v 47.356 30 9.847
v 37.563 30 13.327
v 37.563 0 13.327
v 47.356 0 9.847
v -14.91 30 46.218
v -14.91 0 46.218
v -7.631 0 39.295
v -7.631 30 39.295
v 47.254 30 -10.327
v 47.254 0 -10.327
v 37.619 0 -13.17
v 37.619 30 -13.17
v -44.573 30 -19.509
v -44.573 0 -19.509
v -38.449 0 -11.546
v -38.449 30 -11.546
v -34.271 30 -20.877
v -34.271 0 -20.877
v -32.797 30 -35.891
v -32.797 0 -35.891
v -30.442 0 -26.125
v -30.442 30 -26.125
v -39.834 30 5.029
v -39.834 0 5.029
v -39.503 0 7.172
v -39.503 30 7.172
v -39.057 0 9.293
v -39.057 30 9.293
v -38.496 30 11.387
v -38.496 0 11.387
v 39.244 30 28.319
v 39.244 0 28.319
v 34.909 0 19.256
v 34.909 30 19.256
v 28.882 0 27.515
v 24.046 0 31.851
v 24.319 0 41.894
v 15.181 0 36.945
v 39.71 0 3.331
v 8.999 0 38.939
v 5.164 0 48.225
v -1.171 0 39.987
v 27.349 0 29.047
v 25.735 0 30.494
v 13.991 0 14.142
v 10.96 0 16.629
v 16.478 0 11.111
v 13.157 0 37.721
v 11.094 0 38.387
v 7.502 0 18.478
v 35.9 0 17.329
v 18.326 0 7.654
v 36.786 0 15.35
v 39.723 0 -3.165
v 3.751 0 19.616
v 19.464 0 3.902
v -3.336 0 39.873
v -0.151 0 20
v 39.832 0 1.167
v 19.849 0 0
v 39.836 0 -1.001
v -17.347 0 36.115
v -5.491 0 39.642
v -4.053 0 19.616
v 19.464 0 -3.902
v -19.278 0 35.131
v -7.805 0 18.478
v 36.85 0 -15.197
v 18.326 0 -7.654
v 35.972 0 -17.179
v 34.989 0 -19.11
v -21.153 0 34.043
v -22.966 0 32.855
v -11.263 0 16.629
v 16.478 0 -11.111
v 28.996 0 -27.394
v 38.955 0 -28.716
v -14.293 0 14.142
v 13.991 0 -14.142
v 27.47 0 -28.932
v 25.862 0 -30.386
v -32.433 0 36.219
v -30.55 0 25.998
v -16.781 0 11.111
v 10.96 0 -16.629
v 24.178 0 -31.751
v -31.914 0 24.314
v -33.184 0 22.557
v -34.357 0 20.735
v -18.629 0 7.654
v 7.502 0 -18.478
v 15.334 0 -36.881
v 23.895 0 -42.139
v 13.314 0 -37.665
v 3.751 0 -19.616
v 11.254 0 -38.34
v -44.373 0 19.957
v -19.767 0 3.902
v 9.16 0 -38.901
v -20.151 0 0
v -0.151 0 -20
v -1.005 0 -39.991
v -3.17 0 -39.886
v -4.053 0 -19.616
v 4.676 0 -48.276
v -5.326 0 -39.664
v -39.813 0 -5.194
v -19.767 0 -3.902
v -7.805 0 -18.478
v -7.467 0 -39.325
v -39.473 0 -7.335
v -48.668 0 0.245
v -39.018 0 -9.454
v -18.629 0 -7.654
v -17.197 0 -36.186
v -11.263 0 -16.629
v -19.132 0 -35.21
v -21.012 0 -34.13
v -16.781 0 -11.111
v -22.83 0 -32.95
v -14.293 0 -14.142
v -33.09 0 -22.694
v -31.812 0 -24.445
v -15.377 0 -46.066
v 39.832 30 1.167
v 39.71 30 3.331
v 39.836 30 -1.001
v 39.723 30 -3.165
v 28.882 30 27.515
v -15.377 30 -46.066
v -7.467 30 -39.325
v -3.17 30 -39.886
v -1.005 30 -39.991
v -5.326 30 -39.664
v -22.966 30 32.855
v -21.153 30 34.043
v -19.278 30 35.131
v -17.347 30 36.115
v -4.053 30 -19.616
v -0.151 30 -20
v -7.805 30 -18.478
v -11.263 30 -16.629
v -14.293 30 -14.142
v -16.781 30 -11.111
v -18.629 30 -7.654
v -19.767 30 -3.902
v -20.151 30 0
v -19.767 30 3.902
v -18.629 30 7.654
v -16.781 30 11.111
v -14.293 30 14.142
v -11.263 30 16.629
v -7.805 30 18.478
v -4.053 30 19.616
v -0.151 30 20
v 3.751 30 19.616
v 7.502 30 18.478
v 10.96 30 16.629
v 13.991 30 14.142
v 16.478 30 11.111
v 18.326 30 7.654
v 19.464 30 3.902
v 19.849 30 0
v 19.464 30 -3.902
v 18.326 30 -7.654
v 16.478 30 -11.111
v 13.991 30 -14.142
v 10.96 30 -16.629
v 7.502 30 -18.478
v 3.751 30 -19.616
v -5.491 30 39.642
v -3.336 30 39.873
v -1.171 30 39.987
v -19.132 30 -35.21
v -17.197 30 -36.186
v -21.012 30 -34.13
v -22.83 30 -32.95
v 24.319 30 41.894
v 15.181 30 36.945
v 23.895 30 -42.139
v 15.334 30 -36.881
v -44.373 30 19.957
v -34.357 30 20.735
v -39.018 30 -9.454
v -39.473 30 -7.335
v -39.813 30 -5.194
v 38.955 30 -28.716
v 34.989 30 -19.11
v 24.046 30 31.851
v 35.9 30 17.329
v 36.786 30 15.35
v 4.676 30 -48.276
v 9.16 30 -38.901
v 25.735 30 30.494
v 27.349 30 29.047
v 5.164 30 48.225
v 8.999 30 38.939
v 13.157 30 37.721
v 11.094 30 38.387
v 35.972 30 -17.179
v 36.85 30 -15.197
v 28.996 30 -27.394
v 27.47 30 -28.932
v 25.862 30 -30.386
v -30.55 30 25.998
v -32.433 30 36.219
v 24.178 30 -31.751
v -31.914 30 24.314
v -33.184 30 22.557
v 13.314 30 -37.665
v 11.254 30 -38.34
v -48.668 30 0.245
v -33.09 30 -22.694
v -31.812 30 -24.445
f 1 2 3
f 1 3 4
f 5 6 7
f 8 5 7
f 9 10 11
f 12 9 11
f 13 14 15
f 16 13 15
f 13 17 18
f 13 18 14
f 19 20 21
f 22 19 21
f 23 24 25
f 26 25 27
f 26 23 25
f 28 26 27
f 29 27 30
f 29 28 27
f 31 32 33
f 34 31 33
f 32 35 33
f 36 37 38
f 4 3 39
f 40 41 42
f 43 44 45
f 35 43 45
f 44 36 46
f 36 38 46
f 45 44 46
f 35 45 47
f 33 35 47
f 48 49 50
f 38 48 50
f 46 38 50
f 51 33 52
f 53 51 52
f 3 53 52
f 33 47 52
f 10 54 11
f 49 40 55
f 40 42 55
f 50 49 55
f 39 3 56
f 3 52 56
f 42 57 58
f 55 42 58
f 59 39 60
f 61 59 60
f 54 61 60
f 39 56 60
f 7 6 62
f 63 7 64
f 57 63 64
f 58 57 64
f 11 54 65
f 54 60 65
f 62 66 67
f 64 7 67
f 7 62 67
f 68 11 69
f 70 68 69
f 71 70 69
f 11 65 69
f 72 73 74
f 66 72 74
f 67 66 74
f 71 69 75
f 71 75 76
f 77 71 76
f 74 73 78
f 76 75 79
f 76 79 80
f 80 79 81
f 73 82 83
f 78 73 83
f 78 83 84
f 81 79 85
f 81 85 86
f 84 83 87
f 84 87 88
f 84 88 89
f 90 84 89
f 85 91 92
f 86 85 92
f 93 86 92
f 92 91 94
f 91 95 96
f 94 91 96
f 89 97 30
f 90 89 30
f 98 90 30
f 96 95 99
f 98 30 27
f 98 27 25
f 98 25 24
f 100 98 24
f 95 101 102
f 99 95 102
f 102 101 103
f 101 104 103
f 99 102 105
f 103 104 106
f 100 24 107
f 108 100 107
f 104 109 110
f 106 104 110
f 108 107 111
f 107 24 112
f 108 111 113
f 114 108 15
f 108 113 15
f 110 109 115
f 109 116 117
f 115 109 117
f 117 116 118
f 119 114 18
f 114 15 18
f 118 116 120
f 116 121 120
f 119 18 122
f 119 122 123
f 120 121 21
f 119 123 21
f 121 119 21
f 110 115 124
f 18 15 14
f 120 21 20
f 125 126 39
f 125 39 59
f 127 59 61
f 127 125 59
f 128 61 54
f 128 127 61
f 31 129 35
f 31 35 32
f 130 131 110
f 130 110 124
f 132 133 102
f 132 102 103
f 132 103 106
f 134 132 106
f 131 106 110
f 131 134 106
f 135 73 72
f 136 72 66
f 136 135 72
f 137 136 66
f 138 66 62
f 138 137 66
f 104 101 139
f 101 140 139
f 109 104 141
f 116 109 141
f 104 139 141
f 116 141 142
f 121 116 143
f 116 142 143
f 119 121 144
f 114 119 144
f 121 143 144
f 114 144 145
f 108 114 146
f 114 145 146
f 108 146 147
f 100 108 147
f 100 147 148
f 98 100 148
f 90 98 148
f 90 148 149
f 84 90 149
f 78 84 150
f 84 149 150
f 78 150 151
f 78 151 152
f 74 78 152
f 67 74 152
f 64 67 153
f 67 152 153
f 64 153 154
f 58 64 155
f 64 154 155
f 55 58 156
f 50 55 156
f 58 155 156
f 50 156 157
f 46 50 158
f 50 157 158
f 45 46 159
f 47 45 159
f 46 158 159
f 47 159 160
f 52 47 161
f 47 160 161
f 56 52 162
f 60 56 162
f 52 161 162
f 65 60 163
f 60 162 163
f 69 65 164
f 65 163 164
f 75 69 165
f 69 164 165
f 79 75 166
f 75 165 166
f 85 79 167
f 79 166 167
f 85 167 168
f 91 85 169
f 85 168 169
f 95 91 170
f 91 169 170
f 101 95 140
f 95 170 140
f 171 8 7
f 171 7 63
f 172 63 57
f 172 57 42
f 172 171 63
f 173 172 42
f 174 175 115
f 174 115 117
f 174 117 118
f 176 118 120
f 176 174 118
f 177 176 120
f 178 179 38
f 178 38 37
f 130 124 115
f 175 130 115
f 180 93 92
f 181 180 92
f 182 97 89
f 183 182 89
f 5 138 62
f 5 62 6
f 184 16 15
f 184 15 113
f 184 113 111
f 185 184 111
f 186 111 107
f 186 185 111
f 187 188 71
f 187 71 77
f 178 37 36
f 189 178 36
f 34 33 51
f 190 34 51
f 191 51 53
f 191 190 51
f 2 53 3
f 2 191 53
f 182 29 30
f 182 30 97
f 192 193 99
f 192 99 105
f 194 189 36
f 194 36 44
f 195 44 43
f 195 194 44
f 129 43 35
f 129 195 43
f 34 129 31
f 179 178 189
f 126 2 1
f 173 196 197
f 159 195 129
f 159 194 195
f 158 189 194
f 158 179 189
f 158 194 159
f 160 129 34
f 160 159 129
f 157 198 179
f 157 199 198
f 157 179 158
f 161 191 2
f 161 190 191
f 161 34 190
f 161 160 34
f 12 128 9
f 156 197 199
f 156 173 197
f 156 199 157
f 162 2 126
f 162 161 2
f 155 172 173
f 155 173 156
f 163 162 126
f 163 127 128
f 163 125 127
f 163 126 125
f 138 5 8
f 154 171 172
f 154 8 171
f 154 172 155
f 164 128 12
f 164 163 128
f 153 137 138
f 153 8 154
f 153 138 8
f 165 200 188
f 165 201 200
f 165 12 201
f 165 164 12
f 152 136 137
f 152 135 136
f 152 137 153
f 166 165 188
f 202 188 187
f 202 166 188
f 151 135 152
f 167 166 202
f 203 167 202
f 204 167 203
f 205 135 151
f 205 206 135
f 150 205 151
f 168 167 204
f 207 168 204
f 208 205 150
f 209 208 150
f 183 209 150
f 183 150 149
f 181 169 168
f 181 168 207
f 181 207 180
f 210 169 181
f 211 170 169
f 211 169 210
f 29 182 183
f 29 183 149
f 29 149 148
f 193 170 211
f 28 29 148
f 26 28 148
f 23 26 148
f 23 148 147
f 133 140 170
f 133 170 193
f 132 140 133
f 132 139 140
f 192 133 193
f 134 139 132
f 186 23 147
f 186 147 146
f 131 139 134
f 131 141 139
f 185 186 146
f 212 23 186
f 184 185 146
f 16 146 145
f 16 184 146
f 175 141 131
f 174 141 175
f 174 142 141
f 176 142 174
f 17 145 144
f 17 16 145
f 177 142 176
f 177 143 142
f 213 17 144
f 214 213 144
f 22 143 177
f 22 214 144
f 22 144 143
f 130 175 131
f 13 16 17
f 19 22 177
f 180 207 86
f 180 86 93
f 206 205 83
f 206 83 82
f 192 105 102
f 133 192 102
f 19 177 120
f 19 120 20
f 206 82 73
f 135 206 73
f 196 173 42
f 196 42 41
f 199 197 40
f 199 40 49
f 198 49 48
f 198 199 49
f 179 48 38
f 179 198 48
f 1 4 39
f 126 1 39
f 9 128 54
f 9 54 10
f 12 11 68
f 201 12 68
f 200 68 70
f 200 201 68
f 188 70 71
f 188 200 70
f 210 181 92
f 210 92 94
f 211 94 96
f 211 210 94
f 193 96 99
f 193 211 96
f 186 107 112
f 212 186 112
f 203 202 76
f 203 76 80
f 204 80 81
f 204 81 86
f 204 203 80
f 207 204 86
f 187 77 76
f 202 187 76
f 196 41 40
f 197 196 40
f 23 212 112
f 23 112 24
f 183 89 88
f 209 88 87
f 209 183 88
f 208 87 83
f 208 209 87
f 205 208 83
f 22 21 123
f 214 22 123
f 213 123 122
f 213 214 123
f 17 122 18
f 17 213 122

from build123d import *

# Parameters (mm, degrees)
SKETCH_16_W              = 20
SKETCH_16_H              = 30
EXTRUDE_2_DEPTH          = 30
PATTERN_CIRCULAR_3_COUNT = 15


with BuildPart() as part:
    # 草图16 → 旋转5 (revolve)
    with BuildSketch(Plane.XY, mode=Mode.PRIVATE) as revolve_5_sk:
        with Locations((-30.151216768, 15)):
            Rectangle(SKETCH_16_W, SKETCH_16_H)
    revolve(revolve_5_sk.sketch.rotate(Axis((-0.151216768, 0, 0), (0, 1, 0)), 270), axis=Axis((-0.151216768, 0, 0), (0, 1, 0)))

    # 草图17 → 凸台-拉伸2 (add, through all)
    with BuildSketch(Plane(origin=(0, 30, 0), x_dir=(1, 0, 0), z_dir=(0, 1, 0))):
        with BuildLine():
            Line((-48.6676208, -0.245209253), (-39.833774171, -5.029377496))
            ThreePointArc((-39.833774171, -5.029377496), (-40.151130439, 0.083104397), (-39.81253347, 5.194223472))
            Line((-39.81253347, 5.194223472), (-48.6676208, -0.245209253))
        make_face()
    extrude_2 = extrude(amount=-EXTRUDE_2_DEPTH)

    # 阵列(圆周)3: 凸台-拉伸2 ×15 about axis
    pattern_circular_3_axis = Axis((-0.151216768, 0, 0), (0, 1, 0))
    for i in range(1, PATTERN_CIRCULAR_3_COUNT):
        add(extrude_2.rotate(pattern_circular_3_axis, i * 360 / PATTERN_CIRCULAR_3_COUNT))


solid = part.part
